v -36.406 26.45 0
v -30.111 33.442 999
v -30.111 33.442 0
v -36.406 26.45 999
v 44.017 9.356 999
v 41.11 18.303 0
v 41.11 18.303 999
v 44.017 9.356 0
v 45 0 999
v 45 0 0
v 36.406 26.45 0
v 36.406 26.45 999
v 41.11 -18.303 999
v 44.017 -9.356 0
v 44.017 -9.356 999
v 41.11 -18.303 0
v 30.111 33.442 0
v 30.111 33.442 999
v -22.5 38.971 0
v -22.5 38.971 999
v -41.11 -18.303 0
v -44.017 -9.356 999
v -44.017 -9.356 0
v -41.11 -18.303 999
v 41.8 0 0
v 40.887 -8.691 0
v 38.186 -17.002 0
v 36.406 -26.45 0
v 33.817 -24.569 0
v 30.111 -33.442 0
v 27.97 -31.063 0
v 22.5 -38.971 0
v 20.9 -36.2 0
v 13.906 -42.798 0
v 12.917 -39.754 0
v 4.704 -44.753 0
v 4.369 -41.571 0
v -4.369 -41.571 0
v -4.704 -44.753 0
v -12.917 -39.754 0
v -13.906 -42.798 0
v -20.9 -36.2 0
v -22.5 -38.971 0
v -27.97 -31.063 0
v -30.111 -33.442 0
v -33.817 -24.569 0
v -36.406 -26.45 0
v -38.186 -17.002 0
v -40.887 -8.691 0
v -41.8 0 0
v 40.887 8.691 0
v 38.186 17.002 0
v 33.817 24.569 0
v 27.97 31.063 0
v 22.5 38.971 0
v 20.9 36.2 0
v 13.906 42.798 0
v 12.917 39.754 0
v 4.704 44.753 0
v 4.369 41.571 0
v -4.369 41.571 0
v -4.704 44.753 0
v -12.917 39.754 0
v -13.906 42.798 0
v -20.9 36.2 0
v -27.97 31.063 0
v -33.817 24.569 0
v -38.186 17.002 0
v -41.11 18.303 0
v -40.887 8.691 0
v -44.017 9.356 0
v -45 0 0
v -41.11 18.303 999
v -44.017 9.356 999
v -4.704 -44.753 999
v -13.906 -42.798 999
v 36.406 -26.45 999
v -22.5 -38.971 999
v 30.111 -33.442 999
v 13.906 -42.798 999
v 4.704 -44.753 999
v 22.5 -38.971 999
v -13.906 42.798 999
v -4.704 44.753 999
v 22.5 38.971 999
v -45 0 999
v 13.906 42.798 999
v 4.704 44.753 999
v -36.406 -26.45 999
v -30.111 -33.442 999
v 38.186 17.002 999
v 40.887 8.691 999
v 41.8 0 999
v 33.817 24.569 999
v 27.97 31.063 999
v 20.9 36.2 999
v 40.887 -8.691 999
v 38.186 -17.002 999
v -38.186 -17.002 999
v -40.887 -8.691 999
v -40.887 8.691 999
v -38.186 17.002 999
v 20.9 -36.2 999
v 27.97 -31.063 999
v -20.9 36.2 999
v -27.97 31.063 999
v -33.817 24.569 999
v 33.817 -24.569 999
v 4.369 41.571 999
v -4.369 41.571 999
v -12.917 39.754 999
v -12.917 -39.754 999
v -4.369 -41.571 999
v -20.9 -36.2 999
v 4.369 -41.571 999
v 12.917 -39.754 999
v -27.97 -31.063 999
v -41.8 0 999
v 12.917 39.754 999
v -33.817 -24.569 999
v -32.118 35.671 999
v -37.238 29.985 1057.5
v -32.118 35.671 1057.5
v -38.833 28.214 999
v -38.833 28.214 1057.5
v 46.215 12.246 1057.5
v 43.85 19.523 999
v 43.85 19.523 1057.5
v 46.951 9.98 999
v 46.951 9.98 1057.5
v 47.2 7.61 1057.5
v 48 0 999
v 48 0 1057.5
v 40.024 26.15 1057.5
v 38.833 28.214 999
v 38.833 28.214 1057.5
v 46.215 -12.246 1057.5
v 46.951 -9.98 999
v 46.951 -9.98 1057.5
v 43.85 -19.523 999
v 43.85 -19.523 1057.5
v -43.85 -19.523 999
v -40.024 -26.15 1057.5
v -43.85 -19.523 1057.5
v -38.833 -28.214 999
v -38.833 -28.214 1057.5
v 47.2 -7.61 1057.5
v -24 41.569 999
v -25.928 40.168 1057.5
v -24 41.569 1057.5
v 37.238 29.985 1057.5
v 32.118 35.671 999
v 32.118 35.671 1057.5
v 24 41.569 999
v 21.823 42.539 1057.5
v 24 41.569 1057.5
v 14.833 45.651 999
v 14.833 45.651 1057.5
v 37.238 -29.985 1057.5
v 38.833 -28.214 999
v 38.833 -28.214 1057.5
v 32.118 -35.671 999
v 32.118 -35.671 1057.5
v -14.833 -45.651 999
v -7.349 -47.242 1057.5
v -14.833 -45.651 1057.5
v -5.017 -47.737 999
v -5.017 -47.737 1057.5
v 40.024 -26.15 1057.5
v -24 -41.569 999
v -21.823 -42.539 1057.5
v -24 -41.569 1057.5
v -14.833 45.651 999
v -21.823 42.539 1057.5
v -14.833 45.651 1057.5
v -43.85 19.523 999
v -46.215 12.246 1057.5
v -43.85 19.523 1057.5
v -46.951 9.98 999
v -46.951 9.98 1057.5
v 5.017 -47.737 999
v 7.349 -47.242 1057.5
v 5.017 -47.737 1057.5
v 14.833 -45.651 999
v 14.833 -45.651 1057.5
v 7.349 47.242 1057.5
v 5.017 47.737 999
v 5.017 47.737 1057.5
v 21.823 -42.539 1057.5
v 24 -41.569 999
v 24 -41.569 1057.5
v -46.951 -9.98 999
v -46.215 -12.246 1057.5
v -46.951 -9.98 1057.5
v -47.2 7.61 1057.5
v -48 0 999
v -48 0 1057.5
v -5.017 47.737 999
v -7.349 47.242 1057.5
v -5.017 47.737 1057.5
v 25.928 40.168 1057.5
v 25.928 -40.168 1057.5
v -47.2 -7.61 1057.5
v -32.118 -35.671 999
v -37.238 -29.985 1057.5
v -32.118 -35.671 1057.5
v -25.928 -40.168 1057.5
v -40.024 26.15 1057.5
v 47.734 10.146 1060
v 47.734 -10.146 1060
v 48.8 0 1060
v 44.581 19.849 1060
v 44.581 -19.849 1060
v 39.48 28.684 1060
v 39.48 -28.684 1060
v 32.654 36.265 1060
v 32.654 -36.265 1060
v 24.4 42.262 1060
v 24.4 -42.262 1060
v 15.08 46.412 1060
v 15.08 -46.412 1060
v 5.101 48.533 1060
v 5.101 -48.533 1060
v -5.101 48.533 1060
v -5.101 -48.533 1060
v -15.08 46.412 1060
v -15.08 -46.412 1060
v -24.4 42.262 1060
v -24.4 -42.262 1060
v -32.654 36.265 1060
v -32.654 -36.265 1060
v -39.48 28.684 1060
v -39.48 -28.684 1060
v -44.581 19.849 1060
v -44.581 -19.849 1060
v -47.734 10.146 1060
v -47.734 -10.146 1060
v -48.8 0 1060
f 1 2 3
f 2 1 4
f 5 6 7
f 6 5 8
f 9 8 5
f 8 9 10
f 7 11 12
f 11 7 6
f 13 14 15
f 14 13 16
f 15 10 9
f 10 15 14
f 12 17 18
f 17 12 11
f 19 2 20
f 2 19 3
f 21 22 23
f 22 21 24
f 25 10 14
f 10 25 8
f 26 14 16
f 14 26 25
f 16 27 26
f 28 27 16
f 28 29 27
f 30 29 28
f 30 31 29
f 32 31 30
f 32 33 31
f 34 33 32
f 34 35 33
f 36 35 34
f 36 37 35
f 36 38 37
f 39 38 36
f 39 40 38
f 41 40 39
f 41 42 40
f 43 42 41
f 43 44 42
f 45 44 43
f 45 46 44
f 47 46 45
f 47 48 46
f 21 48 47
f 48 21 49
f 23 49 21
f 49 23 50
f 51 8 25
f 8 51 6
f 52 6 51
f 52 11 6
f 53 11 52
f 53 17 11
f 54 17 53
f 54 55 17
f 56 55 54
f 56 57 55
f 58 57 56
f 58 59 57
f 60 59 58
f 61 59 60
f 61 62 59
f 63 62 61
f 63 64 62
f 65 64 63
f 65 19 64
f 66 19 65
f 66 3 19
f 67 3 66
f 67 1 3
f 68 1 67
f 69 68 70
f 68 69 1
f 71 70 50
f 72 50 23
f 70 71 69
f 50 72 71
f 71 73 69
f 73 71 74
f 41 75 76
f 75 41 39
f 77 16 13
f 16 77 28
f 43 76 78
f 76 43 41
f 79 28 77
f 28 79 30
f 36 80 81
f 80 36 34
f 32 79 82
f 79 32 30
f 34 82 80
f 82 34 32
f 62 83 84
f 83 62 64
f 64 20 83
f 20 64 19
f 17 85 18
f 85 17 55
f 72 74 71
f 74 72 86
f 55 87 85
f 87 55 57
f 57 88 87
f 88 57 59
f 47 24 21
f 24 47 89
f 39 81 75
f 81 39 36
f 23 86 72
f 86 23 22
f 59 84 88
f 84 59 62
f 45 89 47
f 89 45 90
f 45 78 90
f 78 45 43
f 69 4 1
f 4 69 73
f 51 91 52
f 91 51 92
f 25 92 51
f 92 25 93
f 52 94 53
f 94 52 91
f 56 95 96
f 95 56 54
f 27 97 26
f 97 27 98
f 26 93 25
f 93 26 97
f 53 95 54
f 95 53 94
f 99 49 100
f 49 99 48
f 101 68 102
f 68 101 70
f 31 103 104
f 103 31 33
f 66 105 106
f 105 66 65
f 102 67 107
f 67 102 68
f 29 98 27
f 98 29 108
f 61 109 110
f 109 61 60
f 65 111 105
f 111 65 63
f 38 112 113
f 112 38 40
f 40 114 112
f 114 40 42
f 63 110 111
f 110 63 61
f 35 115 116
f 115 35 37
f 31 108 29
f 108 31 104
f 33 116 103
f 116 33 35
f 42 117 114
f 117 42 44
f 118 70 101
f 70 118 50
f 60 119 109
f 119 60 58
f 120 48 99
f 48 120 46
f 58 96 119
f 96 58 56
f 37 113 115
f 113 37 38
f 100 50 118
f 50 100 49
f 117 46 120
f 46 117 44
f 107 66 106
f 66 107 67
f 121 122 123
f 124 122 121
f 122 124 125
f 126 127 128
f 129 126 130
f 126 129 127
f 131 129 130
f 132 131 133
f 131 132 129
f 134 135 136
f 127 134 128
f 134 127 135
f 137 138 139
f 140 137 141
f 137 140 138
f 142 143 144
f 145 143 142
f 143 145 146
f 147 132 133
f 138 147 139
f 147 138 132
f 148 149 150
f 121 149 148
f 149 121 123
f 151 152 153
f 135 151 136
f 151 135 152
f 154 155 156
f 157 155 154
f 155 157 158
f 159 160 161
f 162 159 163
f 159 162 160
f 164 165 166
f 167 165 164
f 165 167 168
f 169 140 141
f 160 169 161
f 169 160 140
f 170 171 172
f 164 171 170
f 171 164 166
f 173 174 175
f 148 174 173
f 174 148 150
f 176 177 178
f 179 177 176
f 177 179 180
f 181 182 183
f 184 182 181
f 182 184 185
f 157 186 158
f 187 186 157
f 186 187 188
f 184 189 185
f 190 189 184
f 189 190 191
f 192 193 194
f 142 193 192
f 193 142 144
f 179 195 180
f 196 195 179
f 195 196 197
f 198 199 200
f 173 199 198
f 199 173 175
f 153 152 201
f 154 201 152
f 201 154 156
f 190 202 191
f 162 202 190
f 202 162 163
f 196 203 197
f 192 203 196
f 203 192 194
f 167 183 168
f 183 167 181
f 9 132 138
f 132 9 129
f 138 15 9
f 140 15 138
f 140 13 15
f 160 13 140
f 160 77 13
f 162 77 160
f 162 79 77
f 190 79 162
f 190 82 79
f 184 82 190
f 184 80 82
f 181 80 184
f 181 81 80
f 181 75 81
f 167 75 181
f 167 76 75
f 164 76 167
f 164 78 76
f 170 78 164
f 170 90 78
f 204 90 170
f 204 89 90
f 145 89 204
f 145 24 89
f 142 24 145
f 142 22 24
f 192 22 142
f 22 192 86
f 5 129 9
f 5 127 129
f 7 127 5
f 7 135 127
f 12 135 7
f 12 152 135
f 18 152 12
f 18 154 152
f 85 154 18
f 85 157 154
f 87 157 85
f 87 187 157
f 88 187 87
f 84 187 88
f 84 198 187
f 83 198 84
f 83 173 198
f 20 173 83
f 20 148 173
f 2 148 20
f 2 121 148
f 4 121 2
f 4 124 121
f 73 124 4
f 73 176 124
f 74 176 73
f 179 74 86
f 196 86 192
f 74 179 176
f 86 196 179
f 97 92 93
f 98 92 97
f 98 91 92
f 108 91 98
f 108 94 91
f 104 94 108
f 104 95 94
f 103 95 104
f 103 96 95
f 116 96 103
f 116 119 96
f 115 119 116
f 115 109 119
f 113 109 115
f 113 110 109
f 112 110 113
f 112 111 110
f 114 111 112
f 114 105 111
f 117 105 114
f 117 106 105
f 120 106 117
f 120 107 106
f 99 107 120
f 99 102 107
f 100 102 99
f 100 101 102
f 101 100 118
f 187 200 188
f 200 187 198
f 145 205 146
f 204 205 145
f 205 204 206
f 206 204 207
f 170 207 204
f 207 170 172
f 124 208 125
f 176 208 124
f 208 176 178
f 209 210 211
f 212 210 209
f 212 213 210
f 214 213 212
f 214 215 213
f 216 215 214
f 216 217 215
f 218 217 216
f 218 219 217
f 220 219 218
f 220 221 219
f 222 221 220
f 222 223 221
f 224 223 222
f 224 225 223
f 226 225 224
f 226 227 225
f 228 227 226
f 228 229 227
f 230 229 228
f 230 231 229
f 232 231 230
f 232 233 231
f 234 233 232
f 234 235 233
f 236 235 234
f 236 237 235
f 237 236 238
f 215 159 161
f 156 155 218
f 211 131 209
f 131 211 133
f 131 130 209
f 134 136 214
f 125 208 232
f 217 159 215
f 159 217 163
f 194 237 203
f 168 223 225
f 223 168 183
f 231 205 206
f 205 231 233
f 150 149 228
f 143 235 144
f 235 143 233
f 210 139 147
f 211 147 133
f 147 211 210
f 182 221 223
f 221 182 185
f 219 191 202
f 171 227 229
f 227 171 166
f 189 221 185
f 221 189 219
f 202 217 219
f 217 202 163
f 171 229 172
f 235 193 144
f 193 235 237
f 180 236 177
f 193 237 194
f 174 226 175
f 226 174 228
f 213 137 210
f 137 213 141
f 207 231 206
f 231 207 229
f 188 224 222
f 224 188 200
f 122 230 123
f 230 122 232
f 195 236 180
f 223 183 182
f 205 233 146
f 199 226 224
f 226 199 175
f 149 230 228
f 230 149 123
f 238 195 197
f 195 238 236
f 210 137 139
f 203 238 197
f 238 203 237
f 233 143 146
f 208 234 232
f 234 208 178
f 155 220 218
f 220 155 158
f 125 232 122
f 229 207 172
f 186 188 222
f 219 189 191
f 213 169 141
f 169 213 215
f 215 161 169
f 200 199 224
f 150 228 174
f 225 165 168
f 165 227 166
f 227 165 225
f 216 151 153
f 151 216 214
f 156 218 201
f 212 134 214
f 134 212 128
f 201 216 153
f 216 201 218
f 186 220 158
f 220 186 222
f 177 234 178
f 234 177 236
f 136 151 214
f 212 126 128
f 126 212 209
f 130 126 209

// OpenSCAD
// Parameters
nominal_size = 90; //[50:160:1]
length_mm = 1000; //[500:2000:10]
outer_diameter_mm = 90; //[50:160:1]
wall_thickness_mm = 3.2; //[1.6:6.4:0.1]
include_end_fitting = 1; //[0:1:1]
fitting_length_mm = 60; //[30:120:1]
fitting_wall_extra_mm = 2.0; //[0.5:5.0:0.1]
fitting_od_extra_mm = 6.0; //[2.0:15.0:0.1]
socket_depth_mm = 45; //[20:90:1]
socket_clearance_mm = 0.6; //[0.2:1.5:0.1]
lead_in_length_mm = 10; //[3:25:1]
overlap_mm = 1.0; //[0.5:2.0:0.1]

// HT Pipe - complete geometry
module ht_pipe() {
  color([0.85, 0.85, 0.8]) {
    // Pipe body
    difference() {
      cylinder(h=length_mm, r=outer_diameter_mm/2, center=false);
      translate([0, 0, -overlap_mm])
        cylinder(h=length_mm + 2*overlap_mm, r=outer_diameter_mm/2 - wall_thickness_mm, center=false);
    }
    
    // End fitting
    if (include_end_fitting) {
      union() {
        // Outer cylinder of the fitting
        translate([0, 0, length_mm - overlap_mm])
          cylinder(h=fitting_length_mm, r=outer_diameter_mm/2 + fitting_od_extra_mm/2, center=false);
        
        // Lead-in cone
        translate([0, 0, length_mm + fitting_length_mm - lead_in_length_mm])
          cylinder(h=lead_in_length_mm, r1=outer_diameter_mm/2 + socket_clearance_mm, r2=outer_diameter_mm/2 + socket_clearance_mm + wall_thickness_mm, center=false);
      }
      
      // Socket void
      translate([0, 0, length_mm + fitting_length_mm - socket_depth_mm - overlap_mm])
        cylinder(h=socket_depth_mm + overlap_mm, r=outer_diameter_mm/2 + socket_clearance_mm, center=false);
    }
  }
}

// Assembly
module assembly() {
  ht_pipe();
}

assembly();
